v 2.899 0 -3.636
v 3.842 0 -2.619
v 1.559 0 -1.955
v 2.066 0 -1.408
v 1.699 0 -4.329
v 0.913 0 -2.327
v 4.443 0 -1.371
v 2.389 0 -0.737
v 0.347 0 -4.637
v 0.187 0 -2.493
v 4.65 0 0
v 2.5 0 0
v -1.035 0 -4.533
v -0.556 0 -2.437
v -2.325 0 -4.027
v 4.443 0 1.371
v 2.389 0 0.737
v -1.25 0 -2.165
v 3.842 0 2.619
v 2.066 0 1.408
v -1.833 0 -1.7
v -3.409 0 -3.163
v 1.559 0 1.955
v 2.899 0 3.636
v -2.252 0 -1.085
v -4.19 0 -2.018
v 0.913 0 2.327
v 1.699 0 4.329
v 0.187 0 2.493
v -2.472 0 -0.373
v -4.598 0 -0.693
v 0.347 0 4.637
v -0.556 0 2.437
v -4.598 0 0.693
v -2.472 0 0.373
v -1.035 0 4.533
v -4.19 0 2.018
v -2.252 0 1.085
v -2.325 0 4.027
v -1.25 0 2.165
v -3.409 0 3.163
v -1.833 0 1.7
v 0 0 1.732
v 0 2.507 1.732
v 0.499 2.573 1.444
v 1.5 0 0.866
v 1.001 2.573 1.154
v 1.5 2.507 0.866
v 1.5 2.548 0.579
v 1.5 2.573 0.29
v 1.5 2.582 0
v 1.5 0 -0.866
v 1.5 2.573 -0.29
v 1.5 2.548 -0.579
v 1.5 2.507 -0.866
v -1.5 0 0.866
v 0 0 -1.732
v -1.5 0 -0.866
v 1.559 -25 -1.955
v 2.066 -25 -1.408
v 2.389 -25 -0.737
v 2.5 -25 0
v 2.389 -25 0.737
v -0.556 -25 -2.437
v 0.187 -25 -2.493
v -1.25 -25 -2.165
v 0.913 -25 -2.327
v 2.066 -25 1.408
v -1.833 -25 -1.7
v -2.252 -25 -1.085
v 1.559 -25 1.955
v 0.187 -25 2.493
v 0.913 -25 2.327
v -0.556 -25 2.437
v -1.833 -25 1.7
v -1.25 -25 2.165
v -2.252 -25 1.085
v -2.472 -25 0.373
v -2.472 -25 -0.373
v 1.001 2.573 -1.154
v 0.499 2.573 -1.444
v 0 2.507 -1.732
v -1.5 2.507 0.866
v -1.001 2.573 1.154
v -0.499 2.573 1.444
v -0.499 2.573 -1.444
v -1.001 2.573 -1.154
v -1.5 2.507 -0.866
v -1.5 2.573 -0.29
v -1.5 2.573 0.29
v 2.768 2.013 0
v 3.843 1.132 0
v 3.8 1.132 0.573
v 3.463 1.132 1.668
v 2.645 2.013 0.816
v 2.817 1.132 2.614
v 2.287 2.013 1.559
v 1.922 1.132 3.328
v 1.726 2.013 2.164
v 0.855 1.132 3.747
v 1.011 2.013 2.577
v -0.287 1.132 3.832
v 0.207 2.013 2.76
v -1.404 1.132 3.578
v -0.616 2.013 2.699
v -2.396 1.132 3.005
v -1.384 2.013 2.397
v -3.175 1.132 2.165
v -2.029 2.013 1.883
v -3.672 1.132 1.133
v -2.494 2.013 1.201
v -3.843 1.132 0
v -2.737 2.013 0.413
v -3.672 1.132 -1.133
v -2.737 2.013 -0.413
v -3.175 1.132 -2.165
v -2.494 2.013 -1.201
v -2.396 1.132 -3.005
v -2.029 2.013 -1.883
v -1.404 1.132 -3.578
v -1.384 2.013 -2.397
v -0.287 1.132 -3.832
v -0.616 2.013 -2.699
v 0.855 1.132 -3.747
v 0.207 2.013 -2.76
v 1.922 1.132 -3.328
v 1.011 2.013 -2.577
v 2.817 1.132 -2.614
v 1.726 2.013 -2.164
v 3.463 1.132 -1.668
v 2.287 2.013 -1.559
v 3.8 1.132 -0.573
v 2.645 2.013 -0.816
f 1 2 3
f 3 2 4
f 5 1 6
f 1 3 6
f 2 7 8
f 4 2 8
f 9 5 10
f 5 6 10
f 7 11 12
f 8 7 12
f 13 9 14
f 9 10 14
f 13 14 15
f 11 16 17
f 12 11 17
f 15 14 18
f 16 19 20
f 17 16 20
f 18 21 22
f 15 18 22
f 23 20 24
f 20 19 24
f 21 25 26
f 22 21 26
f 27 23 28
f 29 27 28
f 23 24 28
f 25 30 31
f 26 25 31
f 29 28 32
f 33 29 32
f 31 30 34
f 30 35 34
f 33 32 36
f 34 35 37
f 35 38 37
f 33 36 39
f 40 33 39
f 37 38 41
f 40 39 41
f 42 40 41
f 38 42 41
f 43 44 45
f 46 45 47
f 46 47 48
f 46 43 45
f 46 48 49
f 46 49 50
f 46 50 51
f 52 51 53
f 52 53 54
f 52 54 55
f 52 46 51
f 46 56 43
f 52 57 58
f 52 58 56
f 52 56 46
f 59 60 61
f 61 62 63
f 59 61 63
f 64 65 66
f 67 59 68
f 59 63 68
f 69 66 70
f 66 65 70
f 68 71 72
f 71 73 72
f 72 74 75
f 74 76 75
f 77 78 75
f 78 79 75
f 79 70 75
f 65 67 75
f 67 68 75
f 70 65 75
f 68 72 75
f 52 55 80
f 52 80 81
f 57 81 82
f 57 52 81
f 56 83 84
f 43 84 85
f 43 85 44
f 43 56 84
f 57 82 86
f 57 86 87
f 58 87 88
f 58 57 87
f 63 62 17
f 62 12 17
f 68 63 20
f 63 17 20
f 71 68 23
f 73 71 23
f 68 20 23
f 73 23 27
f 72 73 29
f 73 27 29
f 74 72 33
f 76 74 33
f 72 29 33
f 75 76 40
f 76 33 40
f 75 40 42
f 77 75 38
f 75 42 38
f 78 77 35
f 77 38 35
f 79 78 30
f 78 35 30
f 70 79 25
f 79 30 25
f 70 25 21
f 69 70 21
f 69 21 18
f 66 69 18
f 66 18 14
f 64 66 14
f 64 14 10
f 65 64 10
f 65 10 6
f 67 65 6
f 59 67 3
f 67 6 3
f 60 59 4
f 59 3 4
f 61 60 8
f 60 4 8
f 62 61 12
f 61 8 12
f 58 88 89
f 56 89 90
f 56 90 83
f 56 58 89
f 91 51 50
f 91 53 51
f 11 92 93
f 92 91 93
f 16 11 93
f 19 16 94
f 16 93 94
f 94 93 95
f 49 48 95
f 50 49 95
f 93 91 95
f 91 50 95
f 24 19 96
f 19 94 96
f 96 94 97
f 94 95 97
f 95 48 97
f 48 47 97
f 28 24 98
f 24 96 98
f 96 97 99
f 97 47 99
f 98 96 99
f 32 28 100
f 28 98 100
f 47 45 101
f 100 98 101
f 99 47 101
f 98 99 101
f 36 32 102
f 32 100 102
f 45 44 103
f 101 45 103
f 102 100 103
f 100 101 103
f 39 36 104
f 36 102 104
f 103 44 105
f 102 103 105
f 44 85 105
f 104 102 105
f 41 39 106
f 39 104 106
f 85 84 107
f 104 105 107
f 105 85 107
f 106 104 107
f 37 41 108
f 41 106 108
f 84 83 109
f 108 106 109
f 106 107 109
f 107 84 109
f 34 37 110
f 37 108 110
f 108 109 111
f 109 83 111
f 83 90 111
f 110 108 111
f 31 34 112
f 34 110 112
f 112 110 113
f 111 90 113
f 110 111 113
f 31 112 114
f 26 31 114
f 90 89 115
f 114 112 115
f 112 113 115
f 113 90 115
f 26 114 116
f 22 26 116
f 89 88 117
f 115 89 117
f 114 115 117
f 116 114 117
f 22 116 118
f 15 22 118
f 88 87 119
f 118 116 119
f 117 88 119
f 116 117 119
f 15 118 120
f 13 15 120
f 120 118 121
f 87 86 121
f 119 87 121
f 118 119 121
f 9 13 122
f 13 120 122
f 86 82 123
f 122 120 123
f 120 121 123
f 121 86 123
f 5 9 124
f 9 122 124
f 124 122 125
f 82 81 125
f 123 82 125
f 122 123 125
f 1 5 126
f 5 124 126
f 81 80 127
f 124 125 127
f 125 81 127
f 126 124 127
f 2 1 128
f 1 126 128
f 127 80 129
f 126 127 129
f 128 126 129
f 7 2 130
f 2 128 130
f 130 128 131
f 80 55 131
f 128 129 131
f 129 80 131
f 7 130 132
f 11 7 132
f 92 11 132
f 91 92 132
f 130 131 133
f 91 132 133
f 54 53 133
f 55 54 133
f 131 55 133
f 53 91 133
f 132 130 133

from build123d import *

# Parameters (mm, degrees)
CUT_EXTRUDE1_DEPTH = 10


with BuildPart() as part:
    # Sketch1 → Revolve1 (revolve)
    with BuildSketch(Plane.XY):
        with BuildLine():
            Line((0, 0), (0, -25))
            Line((0, -25), (2.5, -25))
            Line((2.5, -25), (2.5, 0))
            Line((2.5, 0), (4.65, 0))
            ThreePointArc((4.65, 0), (2.713968497, 2.045965539), (0, 2.8))
            Line((0, 2.8), (0, 0))
        make_face()
    revolve(axis=Axis((0, 0, 0), (0, -1, 0)))

    # Sketch2 → Cut-Extrude1 (cut)
    with BuildSketch(Plane(origin=(0, 0, 0), x_dir=(1, 0, 0), z_dir=(0, 1, 0))):
        Polygon((0, 1.732050808), (-1.5, 0.866025404), (-1.5, -0.866025404), (0, -1.732050808), (1.5, -0.866025404), (1.5, 0.866025404), align=None)
    extrude(amount=CUT_EXTRUDE1_DEPTH, mode=Mode.SUBTRACT)


solid = part.part
